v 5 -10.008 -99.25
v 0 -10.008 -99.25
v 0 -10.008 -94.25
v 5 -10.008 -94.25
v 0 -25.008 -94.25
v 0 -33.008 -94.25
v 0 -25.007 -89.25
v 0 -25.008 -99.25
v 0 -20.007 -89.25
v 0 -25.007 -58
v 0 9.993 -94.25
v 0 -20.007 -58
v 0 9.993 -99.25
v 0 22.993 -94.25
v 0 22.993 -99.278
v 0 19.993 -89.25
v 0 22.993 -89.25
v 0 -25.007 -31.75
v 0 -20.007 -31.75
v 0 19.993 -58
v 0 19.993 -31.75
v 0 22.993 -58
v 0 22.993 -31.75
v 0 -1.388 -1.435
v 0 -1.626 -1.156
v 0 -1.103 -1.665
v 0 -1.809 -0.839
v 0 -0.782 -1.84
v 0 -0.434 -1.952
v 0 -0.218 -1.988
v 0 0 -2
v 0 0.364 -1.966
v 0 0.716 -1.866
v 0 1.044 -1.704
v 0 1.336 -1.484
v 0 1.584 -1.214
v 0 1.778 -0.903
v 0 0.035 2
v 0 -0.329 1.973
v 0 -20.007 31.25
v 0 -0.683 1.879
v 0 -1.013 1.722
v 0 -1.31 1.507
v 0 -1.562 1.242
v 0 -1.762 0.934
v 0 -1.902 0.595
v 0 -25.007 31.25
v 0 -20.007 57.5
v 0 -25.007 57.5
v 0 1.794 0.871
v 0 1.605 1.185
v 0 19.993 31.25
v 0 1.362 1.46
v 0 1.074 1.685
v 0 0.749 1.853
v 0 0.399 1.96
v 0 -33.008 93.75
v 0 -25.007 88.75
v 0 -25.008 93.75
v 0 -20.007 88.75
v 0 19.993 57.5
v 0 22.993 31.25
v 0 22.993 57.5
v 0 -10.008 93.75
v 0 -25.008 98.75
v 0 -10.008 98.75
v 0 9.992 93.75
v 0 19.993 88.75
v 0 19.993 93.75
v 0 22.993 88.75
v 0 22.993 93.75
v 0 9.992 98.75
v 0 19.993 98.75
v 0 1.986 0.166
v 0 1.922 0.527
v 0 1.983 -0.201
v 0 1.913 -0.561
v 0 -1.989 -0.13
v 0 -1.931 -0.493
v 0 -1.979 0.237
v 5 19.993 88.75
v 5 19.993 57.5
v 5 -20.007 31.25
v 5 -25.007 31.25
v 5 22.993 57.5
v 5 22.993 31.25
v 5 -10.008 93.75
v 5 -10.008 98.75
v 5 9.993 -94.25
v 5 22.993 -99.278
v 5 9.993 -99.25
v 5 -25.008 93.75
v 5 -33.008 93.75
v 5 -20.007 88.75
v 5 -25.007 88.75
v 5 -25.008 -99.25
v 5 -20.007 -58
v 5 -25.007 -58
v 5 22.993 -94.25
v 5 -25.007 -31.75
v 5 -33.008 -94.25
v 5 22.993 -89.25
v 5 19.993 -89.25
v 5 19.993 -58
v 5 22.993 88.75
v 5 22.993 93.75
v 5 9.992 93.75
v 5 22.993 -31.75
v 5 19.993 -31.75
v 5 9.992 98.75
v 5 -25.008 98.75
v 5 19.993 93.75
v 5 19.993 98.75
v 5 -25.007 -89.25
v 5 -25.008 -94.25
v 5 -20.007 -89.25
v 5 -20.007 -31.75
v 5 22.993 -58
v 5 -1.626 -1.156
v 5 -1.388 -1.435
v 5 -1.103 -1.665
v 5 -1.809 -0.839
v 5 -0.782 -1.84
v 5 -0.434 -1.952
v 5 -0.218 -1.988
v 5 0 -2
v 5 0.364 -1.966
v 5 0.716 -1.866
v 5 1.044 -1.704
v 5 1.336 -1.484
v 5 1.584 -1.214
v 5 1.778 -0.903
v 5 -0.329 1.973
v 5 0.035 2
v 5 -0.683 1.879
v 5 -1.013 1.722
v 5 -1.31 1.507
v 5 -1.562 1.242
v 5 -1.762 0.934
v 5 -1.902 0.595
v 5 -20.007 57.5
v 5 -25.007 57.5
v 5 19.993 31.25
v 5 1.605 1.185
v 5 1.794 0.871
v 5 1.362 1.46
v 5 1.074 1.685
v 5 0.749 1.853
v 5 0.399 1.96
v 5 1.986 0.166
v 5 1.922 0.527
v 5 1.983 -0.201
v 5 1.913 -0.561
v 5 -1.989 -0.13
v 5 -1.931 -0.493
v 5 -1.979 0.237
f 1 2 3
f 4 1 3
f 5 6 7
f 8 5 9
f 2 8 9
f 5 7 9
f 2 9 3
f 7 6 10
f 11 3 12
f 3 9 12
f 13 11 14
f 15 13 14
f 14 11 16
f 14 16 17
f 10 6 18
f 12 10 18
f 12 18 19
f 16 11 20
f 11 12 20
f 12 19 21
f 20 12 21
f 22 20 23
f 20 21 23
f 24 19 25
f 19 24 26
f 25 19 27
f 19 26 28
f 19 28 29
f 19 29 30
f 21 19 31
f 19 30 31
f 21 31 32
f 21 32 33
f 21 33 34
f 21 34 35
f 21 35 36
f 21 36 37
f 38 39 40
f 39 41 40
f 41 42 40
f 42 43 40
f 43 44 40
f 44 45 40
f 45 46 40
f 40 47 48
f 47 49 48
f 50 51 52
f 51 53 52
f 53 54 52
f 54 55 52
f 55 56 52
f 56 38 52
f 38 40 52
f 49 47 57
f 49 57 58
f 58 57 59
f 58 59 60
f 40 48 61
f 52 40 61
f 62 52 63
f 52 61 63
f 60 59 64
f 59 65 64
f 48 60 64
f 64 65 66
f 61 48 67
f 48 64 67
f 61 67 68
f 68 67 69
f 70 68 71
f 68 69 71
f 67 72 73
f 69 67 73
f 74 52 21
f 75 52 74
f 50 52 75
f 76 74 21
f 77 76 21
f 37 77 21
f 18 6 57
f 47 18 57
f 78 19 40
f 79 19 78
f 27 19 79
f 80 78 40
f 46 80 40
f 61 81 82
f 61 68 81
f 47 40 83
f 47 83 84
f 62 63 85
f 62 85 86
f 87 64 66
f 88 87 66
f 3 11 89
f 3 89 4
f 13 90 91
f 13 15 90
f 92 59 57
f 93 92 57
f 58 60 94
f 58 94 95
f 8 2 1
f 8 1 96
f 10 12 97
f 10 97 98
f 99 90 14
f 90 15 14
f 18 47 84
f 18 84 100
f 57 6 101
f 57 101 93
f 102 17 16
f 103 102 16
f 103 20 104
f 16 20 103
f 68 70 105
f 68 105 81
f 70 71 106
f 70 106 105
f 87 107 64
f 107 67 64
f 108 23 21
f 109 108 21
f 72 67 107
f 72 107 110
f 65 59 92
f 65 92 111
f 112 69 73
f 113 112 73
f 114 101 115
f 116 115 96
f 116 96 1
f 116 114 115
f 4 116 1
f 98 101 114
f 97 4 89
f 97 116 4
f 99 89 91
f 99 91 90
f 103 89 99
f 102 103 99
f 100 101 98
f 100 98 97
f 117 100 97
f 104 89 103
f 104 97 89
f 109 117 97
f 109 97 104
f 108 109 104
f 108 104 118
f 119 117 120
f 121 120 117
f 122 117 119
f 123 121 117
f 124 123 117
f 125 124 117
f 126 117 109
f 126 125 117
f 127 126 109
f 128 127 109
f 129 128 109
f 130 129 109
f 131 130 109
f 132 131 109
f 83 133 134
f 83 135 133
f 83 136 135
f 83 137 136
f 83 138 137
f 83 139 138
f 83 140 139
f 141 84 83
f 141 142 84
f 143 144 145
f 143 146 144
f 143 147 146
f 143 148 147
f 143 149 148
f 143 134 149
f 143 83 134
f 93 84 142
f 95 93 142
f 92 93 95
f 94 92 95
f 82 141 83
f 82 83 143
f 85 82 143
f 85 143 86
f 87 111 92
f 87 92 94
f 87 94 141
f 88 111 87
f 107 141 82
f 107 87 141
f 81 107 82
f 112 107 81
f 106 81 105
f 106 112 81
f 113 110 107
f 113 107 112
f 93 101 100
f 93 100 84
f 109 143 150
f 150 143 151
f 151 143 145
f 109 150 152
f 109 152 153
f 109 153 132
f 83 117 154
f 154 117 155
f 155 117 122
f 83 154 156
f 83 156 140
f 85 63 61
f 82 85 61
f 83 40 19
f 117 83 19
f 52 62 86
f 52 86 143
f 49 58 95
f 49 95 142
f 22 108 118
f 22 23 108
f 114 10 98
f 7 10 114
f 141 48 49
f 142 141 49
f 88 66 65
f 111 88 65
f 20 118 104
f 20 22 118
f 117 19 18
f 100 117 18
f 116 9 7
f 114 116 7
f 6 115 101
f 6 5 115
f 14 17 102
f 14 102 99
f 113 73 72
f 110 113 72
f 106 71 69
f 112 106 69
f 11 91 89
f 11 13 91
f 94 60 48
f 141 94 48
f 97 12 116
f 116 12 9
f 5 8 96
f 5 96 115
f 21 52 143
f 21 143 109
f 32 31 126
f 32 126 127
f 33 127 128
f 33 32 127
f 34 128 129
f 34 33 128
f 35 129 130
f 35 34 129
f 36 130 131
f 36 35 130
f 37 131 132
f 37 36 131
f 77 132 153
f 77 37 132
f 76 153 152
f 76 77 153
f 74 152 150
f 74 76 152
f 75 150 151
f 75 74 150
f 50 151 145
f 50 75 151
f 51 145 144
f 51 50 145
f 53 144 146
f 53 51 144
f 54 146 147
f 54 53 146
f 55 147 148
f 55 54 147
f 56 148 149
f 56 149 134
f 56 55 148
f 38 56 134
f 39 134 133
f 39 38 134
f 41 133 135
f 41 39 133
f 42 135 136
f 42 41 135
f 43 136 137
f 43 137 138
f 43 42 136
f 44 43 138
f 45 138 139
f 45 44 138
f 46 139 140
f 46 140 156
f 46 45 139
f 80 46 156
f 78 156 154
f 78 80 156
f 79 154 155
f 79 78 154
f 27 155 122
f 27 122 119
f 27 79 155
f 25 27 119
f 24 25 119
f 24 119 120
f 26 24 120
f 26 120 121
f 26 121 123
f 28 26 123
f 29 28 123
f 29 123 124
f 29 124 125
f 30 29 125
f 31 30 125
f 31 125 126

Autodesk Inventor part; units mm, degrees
ref_plane "YZ Plane" through (0, 0, 0) normal (1, 0, 0) x (0, 1, 0)
ref_plane "XZ Plane" through (0, 0, 0) normal (0, 1, 0) x (-1, 0, 0)
ref_plane "XY Plane" through (0, 0, 0) normal (0, 0, 1) x (1, 0, 0)
sketch "Sketch1" plane through (0, 0, 0) normal (1, 0, 0) x (0, 1, 0)
  ellipse E0 centre (0, 0) end of major axis (0, -2) minor radius 1.9928
  line L0 (-20.007, -58.0002) -> (-20.007, -89.2502) projected
  line L1 (-20.007, -89.2502) -> (-25.007, -89.2502) projected
  line L2 (-25.007, -58.0002) -> (-25.007, -89.2502) projected
  line L3 (-20.007, -58.0002) -> (-25.007, -58.0002) projected
  line L4 (-20.007, 31.2498) -> (-20.007, -31.7502) projected
  line L5 (-20.007, -31.7502) -> (-25.007, -31.7502) projected
  line L6 (-25.007, 31.2498) -> (-25.007, -31.7502) projected
  line L7 (-20.007, 31.2498) -> (-25.007, 31.2498) projected
  line L8 (-20.007, 88.7498) -> (-20.007, 57.4998) projected
  line L9 (-20.007, 57.4998) -> (-25.007, 57.4998) projected
  line L10 (-25.007, 88.7498) -> (-25.007, 57.4998) projected
  line L11 (-20.007, 88.7498) -> (-25.007, 88.7498) projected
  line L12 (-25.0077, 93.7498) -> (-25.0077, 98.7498) projected
  line L13 (-10.0085, 98.7498) -> (-25.0077, 98.7498) projected
  line L14 (-10.0085, 93.7498) -> (-10.0085, 98.7498) projected
  line L15 (9.9915, 93.7498) -> (9.9915, 98.7498) projected
  line L16 (19.993, 98.7498) -> (9.9915, 98.7498) projected
  line L17 (9.9915, 93.7498) -> (-10.0085, 93.7498)
  line L18 (-25.0077, 93.7498) -> (-33.0079, 93.7498)
  line L19 (22.993, -99.2777) -> (9.993, -99.2502)
  line L20 (9.993, -99.2502) -> (9.993, -94.2502) projected
  line L21 (9.993, -94.2502) -> (-10.0077, -94.2502) projected
  line L22 (-10.0077, -99.2502) -> (-10.0077, -94.2502) projected
  line L23 (-10.0077, -99.2502) -> (-25.0077, -99.2502) projected
  line L24 (-25.0077, -99.2502) -> (-25.0077, -94.2502) projected
  line L25 (-25.0077, -94.2502) -> (-33.0079, -94.2502) projected
  line L26 (-33.0079, -94.2502) -> (-33.0079, 93.7498)
  line L27 (22.993, -99.2777) -> (22.993, -94.2502)
  line L28 (22.993, -89.2502) -> (22.993, -94.2502)
  line L29 (22.993, -89.2502) -> (19.993, -89.2502)
  line L30 (19.993, -58.0002) -> (19.993, -89.2502)
  line L31 (22.993, -58.0002) -> (19.993, -58.0002)
  line L32 (22.993, -31.7502) -> (22.993, -58.0002)
  line L33 (22.993, -31.7502) -> (19.993, -31.7502)
  line L34 (19.993, 31.2498) -> (19.993, -31.7502)
  line L35 (22.993, 31.2498) -> (19.993, 31.2498)
  line L36 (22.993, 57.4998) -> (22.993, 31.2498)
  line L37 (22.993, 57.4998) -> (19.993, 57.4998)
  line L38 (19.993, 88.7498) -> (19.993, 57.4998)
  line L39 (22.993, 88.7498) -> (19.993, 88.7498)
  line L40 (22.993, 93.7498) -> (22.993, 88.7498)
  line L41 (22.993, 93.7498) -> (19.993, 93.7498)
  line L42 (19.993, 93.7498) -> (19.993, 98.7498)
  point P0 (-29.9123, 87.1698)
  dimension "d21" = 188
  dimension "d26" = 3
extrude "Extrusion1" add sketch "Sketch1" along normal blind 5
properties part number "case top sides" material "ABS Plastic"
